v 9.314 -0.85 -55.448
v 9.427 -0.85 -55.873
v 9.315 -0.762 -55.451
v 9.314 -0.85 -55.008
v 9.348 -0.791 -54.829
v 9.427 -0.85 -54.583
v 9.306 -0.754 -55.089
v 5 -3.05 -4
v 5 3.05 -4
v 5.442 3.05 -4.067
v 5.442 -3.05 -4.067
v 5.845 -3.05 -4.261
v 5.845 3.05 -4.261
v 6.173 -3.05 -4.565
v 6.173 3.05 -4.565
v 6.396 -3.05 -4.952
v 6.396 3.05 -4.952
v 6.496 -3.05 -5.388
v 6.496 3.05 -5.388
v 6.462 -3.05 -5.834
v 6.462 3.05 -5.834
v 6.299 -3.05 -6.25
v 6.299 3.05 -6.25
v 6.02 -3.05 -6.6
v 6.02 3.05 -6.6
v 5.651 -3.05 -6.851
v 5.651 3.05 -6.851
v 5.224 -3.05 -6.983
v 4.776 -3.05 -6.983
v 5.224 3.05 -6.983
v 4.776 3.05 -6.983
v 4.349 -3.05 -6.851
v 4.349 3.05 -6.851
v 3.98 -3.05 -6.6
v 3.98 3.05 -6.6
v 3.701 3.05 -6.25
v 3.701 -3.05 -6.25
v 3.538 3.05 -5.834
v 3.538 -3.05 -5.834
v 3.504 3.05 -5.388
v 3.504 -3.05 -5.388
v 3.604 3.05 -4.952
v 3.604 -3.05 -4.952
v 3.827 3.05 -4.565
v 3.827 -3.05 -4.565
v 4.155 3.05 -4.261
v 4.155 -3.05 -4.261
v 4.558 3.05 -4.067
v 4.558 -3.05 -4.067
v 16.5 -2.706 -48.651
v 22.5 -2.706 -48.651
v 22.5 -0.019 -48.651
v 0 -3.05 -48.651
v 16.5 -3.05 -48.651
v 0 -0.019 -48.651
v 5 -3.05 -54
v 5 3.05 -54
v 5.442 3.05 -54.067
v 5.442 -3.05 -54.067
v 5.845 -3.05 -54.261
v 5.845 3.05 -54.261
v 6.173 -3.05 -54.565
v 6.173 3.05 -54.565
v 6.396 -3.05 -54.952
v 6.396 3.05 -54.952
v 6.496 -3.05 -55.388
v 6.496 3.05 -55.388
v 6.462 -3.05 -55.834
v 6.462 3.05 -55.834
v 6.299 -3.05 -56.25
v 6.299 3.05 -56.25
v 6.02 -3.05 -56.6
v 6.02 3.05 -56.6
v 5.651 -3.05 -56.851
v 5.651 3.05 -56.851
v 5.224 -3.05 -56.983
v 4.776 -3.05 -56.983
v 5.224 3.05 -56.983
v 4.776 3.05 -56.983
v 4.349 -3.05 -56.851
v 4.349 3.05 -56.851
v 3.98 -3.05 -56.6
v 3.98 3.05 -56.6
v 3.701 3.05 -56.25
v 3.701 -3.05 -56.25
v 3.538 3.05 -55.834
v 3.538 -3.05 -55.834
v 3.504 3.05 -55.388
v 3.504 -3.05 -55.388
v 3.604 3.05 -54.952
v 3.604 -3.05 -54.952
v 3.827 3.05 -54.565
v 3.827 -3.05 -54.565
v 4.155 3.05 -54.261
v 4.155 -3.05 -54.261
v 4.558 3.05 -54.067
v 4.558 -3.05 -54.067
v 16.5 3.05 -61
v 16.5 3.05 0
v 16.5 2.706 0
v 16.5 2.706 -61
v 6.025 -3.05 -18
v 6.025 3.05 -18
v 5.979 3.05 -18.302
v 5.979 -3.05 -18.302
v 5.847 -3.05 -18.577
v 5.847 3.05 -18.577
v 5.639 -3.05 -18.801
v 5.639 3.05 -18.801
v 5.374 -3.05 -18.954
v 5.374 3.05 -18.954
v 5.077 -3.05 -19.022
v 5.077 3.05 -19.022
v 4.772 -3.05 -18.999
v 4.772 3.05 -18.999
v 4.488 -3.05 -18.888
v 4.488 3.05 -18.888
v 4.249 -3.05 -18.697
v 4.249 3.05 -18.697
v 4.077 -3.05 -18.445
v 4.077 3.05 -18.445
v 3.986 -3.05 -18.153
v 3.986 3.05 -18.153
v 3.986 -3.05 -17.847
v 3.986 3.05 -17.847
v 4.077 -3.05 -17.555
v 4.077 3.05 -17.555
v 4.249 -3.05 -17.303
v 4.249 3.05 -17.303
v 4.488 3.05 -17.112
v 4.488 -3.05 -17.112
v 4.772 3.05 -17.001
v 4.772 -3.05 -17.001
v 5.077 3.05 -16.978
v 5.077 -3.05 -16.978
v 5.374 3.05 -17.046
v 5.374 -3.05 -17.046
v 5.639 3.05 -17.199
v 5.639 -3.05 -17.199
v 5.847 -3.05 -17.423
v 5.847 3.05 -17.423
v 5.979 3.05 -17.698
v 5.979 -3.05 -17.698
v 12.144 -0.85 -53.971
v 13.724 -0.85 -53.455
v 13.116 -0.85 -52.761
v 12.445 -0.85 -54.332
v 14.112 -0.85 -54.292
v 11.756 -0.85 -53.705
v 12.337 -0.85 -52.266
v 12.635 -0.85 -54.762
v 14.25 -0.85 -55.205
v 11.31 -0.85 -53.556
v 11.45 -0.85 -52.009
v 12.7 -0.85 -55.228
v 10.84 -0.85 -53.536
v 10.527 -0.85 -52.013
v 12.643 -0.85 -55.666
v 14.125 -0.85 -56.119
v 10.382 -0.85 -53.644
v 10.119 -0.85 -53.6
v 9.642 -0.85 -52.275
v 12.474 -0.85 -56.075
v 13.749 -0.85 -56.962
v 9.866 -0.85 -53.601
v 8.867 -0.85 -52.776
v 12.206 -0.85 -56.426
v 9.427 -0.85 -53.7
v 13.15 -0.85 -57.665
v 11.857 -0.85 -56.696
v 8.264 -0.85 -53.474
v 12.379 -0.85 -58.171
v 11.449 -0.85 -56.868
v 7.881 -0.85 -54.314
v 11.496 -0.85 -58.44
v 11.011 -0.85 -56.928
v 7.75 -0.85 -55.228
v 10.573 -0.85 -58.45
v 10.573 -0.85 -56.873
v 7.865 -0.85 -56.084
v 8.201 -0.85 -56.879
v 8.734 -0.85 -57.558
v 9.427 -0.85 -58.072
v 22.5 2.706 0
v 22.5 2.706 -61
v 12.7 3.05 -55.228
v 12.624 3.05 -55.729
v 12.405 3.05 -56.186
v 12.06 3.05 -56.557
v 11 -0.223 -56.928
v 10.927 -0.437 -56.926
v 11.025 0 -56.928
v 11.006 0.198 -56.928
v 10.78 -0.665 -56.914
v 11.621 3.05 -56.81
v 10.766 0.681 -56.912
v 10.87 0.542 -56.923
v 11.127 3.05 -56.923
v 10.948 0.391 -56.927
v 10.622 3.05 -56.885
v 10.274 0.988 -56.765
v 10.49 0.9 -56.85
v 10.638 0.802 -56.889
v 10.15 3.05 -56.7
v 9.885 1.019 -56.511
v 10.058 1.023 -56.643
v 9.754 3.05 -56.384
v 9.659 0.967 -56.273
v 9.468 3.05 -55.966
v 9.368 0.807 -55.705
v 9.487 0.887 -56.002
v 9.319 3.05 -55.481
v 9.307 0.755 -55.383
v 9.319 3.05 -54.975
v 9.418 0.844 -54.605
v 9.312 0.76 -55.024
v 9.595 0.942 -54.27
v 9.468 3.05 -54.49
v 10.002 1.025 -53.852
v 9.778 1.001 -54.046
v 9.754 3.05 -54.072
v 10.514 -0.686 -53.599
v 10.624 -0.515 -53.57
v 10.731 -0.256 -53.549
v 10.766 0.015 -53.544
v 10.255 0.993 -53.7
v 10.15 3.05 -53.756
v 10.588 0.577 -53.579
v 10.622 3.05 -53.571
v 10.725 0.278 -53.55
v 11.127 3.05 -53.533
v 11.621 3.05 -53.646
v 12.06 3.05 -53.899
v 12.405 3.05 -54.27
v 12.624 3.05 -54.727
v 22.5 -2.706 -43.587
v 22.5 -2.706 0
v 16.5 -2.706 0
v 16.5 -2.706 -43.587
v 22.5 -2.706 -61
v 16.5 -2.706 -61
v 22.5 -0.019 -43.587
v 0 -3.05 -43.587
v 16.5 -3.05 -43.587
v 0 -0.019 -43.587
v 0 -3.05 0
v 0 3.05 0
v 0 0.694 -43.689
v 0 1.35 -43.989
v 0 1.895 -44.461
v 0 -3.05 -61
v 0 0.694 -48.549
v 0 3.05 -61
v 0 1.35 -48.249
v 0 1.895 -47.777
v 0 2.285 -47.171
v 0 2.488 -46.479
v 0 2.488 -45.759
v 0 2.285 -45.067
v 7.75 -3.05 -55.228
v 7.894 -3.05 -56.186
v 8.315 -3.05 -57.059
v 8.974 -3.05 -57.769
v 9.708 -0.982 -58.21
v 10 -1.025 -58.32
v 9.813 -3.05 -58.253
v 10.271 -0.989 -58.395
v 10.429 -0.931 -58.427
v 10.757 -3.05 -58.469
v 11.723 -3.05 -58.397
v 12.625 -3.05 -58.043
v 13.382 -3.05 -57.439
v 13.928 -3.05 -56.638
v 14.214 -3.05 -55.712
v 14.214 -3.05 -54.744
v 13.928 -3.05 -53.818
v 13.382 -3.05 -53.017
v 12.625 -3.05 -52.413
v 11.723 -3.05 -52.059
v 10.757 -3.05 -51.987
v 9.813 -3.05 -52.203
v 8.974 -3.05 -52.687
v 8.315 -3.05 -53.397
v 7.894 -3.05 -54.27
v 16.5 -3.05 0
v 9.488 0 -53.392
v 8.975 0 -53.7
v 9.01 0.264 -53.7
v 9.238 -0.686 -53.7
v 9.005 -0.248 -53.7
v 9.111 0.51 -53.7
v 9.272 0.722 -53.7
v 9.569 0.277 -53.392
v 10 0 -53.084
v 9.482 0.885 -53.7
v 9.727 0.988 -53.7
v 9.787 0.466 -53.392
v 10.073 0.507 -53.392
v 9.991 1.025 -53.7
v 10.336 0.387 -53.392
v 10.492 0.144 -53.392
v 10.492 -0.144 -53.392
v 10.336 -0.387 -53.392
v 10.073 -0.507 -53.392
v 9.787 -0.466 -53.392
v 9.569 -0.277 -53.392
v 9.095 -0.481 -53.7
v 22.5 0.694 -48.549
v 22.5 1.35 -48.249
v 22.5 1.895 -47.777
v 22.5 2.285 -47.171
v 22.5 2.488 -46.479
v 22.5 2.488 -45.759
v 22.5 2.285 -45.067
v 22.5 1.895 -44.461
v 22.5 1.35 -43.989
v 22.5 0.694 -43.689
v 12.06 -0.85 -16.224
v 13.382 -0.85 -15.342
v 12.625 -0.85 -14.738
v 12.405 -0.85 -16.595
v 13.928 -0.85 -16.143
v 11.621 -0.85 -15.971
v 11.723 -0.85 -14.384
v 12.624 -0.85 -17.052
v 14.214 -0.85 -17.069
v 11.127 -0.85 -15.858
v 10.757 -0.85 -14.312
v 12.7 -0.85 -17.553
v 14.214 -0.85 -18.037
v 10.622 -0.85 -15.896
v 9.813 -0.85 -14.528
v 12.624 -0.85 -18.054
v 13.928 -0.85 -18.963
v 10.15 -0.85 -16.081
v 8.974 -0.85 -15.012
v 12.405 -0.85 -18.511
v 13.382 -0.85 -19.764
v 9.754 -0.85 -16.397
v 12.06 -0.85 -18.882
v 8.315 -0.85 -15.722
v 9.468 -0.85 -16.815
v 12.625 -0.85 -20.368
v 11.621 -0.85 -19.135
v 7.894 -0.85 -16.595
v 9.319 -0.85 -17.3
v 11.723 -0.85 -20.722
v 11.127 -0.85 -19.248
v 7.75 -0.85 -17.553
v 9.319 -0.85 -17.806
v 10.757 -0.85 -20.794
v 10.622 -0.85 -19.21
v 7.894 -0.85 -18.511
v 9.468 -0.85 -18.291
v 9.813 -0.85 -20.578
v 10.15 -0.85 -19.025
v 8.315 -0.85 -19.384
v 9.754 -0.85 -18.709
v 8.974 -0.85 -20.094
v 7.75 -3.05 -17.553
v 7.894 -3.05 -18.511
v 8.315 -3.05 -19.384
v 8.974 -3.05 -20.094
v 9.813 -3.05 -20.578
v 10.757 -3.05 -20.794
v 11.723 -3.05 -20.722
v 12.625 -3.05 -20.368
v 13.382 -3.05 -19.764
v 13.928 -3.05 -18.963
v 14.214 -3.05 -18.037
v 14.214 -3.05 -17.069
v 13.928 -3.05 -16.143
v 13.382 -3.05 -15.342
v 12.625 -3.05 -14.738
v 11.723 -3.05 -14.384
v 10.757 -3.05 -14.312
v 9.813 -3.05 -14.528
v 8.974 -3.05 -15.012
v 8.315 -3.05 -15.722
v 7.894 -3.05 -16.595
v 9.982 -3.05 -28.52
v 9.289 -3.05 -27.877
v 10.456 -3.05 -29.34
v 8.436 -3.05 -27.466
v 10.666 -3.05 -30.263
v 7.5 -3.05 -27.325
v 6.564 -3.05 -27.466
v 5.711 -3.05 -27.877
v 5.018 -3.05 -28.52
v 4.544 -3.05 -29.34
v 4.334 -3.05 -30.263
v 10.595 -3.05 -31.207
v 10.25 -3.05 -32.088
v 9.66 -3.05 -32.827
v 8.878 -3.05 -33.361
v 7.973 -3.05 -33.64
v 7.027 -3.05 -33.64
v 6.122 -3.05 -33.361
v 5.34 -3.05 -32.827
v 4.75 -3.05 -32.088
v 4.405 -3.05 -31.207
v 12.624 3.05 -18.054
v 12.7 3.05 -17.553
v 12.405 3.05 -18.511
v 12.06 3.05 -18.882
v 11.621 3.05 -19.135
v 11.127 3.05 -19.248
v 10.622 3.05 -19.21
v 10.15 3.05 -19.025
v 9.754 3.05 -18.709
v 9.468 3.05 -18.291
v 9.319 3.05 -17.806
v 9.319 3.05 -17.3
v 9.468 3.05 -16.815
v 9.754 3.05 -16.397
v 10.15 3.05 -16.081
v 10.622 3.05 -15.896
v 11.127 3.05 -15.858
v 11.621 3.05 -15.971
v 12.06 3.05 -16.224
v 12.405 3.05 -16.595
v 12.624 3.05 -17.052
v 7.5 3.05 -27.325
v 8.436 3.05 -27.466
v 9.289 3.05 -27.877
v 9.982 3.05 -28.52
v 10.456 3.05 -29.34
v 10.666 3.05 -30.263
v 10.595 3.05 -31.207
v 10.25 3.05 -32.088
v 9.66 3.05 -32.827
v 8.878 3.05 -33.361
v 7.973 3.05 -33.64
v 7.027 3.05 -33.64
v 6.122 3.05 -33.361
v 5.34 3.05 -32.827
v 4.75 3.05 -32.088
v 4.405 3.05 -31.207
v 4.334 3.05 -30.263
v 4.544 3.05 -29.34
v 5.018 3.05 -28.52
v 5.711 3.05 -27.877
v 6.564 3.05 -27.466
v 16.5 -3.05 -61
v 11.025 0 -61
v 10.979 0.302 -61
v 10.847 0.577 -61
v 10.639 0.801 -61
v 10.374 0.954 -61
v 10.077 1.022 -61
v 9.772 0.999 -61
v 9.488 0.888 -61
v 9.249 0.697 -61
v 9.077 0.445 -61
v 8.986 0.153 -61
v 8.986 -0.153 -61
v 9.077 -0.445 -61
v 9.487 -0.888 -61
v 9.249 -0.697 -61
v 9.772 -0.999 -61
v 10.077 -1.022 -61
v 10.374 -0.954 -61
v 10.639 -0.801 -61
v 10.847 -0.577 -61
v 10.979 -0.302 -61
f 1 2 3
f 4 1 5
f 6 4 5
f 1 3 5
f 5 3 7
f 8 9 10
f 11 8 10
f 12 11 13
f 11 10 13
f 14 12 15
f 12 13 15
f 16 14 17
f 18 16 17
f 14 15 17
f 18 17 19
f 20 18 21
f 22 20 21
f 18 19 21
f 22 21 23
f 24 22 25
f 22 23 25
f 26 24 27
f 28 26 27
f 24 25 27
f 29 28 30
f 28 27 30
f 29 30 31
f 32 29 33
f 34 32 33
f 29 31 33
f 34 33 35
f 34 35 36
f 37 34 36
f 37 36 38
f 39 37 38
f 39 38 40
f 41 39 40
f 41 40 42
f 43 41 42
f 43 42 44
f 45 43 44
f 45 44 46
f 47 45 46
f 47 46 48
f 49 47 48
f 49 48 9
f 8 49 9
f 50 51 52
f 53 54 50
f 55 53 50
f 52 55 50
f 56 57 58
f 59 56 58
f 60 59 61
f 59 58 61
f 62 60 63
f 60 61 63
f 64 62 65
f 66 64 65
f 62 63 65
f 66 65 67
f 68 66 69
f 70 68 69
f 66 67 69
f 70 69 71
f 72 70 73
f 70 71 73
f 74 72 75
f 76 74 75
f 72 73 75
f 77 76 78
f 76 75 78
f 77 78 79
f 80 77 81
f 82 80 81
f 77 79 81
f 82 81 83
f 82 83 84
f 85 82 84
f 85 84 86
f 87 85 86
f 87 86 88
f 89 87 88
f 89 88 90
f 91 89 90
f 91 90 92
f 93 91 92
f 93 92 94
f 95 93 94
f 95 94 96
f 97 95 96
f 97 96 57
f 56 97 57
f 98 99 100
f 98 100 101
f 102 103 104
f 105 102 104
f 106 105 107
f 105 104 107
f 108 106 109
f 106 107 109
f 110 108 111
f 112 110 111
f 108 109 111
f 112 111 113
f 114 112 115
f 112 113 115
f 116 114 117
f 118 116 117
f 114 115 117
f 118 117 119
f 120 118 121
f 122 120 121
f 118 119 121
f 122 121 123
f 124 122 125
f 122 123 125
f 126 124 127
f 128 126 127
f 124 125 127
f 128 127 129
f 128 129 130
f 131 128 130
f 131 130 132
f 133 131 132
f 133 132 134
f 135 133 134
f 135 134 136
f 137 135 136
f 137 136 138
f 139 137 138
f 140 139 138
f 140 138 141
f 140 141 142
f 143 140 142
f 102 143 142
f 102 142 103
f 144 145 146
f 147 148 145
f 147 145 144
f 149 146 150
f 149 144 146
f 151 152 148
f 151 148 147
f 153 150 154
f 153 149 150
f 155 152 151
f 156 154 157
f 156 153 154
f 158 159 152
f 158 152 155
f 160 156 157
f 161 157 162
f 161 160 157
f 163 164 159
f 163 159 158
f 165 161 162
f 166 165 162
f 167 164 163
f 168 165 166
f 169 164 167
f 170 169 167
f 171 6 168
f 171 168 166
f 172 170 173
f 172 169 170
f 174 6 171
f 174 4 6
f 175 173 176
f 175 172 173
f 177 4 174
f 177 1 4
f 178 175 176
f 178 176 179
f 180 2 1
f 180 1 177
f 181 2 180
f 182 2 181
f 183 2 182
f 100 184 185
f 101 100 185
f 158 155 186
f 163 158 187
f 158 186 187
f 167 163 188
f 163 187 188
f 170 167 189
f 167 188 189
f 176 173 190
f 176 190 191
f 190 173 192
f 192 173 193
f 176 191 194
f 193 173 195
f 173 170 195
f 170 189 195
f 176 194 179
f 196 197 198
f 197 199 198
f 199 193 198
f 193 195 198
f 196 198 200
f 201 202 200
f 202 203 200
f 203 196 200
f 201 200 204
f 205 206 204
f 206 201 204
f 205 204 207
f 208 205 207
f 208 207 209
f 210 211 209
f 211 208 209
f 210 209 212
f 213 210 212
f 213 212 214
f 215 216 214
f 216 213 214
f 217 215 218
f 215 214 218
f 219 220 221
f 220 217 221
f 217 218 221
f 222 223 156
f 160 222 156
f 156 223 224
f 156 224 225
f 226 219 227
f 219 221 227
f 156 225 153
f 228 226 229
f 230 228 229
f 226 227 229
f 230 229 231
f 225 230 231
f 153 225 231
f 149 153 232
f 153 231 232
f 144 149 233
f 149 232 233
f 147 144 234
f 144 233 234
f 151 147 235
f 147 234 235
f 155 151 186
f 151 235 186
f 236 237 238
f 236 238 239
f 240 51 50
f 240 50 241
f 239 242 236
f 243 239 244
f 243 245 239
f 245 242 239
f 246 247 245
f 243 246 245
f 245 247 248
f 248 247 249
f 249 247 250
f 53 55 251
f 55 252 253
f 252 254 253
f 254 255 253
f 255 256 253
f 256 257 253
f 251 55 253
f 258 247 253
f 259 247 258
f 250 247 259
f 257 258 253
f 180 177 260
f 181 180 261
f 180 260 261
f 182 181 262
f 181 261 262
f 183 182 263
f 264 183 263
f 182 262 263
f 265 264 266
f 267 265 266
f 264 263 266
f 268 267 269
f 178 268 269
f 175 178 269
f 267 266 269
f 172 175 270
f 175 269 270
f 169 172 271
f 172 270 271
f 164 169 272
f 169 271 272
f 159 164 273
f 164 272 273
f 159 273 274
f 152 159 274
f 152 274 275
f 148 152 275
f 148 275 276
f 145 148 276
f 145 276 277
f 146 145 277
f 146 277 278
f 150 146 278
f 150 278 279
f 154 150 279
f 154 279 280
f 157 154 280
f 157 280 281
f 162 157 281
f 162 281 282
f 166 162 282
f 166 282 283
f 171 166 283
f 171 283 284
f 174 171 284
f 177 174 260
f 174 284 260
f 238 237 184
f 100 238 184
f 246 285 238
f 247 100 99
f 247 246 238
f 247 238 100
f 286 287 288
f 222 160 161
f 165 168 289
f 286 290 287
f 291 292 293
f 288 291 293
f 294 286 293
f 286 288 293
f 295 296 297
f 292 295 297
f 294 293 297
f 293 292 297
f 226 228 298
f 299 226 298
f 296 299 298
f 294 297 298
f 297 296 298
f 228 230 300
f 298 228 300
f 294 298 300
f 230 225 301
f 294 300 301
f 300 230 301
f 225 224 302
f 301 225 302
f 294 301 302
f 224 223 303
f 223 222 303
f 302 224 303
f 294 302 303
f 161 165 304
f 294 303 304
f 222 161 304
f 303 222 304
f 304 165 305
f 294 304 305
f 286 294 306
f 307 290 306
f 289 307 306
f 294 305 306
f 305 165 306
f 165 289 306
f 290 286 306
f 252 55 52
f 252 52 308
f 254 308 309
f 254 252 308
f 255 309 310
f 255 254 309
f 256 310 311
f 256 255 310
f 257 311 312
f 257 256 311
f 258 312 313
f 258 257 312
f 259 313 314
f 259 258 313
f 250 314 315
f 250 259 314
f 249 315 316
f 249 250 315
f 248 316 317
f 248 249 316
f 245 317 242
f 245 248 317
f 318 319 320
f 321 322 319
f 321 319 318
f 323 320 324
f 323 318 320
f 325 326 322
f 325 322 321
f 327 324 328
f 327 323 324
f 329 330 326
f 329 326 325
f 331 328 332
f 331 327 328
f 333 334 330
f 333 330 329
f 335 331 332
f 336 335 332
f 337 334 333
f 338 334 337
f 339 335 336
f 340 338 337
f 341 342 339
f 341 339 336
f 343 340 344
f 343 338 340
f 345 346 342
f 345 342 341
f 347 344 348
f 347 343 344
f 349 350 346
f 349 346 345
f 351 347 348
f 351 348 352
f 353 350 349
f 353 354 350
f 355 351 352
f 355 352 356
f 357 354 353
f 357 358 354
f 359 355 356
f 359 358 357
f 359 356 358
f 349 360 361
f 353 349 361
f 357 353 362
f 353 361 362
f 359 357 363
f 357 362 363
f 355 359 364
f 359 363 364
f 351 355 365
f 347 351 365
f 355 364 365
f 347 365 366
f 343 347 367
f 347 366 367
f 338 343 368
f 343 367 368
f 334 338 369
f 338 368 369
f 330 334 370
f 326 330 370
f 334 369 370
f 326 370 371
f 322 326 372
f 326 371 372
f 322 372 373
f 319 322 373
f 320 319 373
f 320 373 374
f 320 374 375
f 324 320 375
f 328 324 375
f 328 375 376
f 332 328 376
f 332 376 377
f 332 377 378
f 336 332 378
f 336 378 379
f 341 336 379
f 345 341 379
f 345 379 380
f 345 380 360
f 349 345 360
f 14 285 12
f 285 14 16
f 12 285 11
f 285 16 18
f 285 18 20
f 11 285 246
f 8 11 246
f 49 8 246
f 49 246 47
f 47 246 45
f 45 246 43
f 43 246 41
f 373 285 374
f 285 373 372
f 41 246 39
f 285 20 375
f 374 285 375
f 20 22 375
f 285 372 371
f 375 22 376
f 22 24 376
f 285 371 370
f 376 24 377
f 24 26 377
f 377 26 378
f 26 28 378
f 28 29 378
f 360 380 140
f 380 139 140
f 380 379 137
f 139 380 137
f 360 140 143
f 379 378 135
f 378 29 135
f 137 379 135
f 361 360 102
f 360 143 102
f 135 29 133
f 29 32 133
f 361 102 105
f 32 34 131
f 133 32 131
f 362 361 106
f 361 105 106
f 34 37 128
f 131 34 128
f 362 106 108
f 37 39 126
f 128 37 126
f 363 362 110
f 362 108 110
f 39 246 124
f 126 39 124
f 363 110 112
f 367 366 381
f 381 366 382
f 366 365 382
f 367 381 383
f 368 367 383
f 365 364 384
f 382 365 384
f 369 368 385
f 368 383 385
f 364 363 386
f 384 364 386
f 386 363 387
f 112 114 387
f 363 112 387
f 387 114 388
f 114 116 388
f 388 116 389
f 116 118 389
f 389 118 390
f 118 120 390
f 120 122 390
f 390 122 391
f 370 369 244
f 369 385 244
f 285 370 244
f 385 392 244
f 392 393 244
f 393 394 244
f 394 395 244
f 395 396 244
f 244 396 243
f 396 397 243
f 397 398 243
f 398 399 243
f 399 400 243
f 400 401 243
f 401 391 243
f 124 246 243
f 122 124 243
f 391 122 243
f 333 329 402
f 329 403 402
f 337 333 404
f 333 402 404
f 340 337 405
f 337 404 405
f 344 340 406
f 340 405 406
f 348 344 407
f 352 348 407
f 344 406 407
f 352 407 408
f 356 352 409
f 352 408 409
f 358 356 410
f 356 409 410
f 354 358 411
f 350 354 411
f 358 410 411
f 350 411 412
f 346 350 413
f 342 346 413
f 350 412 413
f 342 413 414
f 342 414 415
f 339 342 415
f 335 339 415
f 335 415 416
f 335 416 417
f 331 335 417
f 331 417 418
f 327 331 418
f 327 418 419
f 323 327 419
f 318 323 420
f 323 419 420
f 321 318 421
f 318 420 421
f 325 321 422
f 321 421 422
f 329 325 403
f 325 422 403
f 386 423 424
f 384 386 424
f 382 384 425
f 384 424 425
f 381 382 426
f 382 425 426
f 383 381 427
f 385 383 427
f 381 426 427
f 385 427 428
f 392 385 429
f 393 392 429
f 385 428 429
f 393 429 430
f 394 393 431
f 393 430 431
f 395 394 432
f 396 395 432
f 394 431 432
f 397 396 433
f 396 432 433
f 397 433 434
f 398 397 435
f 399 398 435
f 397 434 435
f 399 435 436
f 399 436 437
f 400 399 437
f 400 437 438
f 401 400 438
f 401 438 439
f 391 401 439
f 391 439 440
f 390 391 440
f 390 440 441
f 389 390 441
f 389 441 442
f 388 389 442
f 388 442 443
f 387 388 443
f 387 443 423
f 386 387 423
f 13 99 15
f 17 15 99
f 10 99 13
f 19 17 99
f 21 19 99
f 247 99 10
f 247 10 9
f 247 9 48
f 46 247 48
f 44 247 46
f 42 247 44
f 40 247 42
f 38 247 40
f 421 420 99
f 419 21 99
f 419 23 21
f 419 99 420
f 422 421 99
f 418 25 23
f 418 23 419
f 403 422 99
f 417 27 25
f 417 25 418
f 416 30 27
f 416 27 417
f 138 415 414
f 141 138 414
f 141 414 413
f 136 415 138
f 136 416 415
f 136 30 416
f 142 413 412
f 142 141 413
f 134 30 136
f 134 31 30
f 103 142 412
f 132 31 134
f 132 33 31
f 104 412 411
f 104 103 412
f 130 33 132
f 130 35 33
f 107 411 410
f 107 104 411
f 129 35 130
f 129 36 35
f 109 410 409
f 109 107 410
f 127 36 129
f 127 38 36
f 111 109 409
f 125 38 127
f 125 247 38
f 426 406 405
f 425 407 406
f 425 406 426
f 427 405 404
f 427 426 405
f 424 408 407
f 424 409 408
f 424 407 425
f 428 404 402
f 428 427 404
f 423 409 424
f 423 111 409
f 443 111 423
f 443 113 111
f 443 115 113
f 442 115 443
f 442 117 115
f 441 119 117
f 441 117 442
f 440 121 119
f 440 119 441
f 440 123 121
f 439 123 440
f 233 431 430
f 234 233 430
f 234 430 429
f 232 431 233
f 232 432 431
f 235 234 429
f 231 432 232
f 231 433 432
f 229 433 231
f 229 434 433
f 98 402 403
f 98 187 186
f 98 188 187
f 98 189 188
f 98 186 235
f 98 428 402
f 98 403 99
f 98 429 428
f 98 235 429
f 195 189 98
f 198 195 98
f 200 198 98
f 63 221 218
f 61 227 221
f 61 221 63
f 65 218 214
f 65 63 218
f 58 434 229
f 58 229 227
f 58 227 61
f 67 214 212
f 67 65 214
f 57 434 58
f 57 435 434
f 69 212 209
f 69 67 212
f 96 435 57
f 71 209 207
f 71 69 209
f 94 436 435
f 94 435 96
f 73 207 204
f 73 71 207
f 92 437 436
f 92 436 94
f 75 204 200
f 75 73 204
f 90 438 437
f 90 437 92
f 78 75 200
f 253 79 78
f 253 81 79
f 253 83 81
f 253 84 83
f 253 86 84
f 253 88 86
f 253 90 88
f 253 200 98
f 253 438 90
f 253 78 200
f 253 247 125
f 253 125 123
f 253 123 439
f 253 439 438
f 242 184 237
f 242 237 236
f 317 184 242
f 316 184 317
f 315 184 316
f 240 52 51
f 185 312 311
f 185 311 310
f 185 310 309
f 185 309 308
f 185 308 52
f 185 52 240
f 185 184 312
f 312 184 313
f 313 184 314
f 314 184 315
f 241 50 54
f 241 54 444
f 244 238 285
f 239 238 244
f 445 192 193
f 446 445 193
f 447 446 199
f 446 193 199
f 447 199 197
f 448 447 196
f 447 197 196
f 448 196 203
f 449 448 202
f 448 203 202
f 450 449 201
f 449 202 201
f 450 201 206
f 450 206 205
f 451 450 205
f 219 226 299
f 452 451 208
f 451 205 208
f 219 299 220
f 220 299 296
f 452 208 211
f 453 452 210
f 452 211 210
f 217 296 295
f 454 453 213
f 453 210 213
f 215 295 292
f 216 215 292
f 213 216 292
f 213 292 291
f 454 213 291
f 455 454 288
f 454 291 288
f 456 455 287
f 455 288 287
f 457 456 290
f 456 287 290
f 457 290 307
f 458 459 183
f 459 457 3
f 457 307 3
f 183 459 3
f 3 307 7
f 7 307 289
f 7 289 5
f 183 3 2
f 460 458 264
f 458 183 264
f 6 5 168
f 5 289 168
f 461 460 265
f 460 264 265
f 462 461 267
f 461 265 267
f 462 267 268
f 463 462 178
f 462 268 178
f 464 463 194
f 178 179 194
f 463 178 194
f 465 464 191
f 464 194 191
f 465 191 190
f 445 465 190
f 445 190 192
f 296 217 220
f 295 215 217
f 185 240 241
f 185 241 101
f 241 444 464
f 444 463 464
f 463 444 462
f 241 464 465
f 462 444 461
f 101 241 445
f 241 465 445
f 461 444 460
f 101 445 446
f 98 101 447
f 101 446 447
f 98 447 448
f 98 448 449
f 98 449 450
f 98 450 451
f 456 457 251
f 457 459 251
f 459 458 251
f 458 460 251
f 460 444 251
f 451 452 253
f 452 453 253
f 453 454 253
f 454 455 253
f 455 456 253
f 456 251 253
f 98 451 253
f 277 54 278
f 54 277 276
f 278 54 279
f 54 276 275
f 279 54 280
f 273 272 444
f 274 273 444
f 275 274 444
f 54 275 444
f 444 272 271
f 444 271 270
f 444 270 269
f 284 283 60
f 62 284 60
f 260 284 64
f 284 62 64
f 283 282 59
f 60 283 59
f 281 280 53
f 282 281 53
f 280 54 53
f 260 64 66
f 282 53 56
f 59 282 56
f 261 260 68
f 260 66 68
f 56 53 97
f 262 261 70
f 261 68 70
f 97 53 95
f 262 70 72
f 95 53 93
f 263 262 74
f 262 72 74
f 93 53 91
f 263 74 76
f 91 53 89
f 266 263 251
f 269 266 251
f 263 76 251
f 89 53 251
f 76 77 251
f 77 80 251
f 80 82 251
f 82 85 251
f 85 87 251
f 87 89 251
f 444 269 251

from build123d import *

# Parameters (mm, degrees)
SKETCH1_W                                        = 61
SKETCH1_H                                        = 6.1
BOSS_EXTRUDE1_DEPTH                              = 22.5
SKETCH2_OUTSIDE_W                                = 76.06
SKETCH2_OUTSIDE_H                                = 21.16
SKETCH2_OUTSIDE_W_2                              = 61
SKETCH2_OUTSIDE_H_2                              = 5.41284
CUT_EXTRUDE1_DEPTH                               = 6
CUT_EXTRUDE3_DEPTH                               = 23.5
SKETCH6_R                                        = 3.175
CUT_EXTRUDE4_DEPTH                               = 7.1
SKETCH7_R                                        = 1.5
CUT_EXTRUDE5_DEPTH                               = 7.1
M2_5X0_45_TAPPED_HOLE1_D                         = 2.05
M2_5X0_45_TAPPED_HOLE2_D                         = 2.05
M2_5X0_45_TAPPED_HOLE2_DEPTH                     = 7.3
M2_5X0_45_TAPPED_HOLE2_TIP                       = 0.615882135
CBORE_FOR_M3_PAN_HEAD_MACHINE_SCREW1_D           = 3.4
CBORE_FOR_M3_PAN_HEAD_MACHINE_SCREW1_CBORE_D     = 6.5
CBORE_FOR_M3_PAN_HEAD_MACHINE_SCREW1_CBORE_DEPTH = 2.2


with BuildPart() as part:
    # Sketch1 → Boss-Extrude1 (new body)
    with BuildSketch(Plane(origin=(0, 0, 0), x_dir=(0, 0, -1), z_dir=(1, 0, 0))):
        with Locations((30.5, 0)):
            Rectangle(SKETCH1_W, SKETCH1_H)
    extrude(amount=BOSS_EXTRUDE1_DEPTH)

    # Sketch2 outside → Cut-Extrude1 (cut)
    with BuildSketch(Plane(origin=(22.5, 0, 0), x_dir=(0, 0, -1), z_dir=(1, 0, 0))):
        with Locations((30.5, 0)):
            Rectangle(SKETCH2_OUTSIDE_W, SKETCH2_OUTSIDE_H)
        with Locations((30.5, 0)):
            Rectangle(SKETCH2_OUTSIDE_W_2, SKETCH2_OUTSIDE_H_2, mode=Mode.SUBTRACT)
    extrude(amount=-CUT_EXTRUDE1_DEPTH, mode=Mode.SUBTRACT)

    # Sketch5 → Cut-Extrude3 (cut, through all)
    with BuildSketch(Plane.ZY):
        with BuildLine():
            Line((-43.5866, -0.01898), (-43.5866, -3.05))
            Line((-43.5866, -3.05), (-48.6514, -3.05))
            Line((-48.6514, -3.05), (-48.6514, -0.01898))
            ThreePointArc((-48.6514, -0.01898), (-46.119, 2.51342), (-43.5866, -0.01898))
        make_face()
    extrude(amount=-CUT_EXTRUDE3_DEPTH, mode=Mode.SUBTRACT)

    # Sketch6 → Cut-Extrude4 (cut, through all)
    with BuildSketch(Plane(origin=(0, 3.05, 0), x_dir=(1, 0, 0), z_dir=(0, 1, 0))):
        with Locations(Location((7.5, 30.5, 0), (0, 0, 270))):  # turned: the seam where the file's is
            Circle(SKETCH6_R)
    extrude(amount=-CUT_EXTRUDE4_DEPTH, mode=Mode.SUBTRACT)

    # Sketch7 → Cut-Extrude5 (cut, through all)
    with BuildSketch(Plane(origin=(0, 3.05, 0), x_dir=(1, 0, 0), z_dir=(0, 1, 0))):
        with Locations(Location((5, 55.5, 0), (0, 0, 270))):  # turned: the seam where the file's is
            Circle(SKETCH7_R)
        with Locations(Location((5, 5.5, 0), (0, 0, 270))):  # turned: the seam where the file's is
            Circle(SKETCH7_R)
    extrude(amount=-CUT_EXTRUDE5_DEPTH, mode=Mode.SUBTRACT)

    # M2.5x0.45 Tapped Hole1 (through all)
    with Locations(Plane(origin=(0, -3.05, 0), x_dir=(-1, 0, 0), z_dir=(0, -1, 0))):
        with Locations((-5, 18)):
            Hole(M2_5X0_45_TAPPED_HOLE1_D / 2)

    # M2.5x0.45 Tapped Hole2
    with Locations(Plane(origin=(0, 0, -61), x_dir=(-1, 0, 0), z_dir=(0, 0, -1))):
        with Locations((-10, 0)):
            Hole(M2_5X0_45_TAPPED_HOLE2_D / 2, depth=M2_5X0_45_TAPPED_HOLE2_DEPTH)
            with Locations((0, 0, -(M2_5X0_45_TAPPED_HOLE2_DEPTH + M2_5X0_45_TAPPED_HOLE2_TIP / 2))):  # 118° drill point
                Cone(0, M2_5X0_45_TAPPED_HOLE2_D / 2, M2_5X0_45_TAPPED_HOLE2_TIP, mode=Mode.SUBTRACT)

    # CBORE for M3 Pan Head Machine Screw1 (through all)
    with Locations(Plane(origin=(0, -3.05, 0), x_dir=(-1, 0, 0), z_dir=(0, -1, 0))):
        with Locations((-11, 55.228), (-11, 17.553)):
            CounterBoreHole(CBORE_FOR_M3_PAN_HEAD_MACHINE_SCREW1_D / 2, CBORE_FOR_M3_PAN_HEAD_MACHINE_SCREW1_CBORE_D / 2, CBORE_FOR_M3_PAN_HEAD_MACHINE_SCREW1_CBORE_DEPTH)


solid = part.part
